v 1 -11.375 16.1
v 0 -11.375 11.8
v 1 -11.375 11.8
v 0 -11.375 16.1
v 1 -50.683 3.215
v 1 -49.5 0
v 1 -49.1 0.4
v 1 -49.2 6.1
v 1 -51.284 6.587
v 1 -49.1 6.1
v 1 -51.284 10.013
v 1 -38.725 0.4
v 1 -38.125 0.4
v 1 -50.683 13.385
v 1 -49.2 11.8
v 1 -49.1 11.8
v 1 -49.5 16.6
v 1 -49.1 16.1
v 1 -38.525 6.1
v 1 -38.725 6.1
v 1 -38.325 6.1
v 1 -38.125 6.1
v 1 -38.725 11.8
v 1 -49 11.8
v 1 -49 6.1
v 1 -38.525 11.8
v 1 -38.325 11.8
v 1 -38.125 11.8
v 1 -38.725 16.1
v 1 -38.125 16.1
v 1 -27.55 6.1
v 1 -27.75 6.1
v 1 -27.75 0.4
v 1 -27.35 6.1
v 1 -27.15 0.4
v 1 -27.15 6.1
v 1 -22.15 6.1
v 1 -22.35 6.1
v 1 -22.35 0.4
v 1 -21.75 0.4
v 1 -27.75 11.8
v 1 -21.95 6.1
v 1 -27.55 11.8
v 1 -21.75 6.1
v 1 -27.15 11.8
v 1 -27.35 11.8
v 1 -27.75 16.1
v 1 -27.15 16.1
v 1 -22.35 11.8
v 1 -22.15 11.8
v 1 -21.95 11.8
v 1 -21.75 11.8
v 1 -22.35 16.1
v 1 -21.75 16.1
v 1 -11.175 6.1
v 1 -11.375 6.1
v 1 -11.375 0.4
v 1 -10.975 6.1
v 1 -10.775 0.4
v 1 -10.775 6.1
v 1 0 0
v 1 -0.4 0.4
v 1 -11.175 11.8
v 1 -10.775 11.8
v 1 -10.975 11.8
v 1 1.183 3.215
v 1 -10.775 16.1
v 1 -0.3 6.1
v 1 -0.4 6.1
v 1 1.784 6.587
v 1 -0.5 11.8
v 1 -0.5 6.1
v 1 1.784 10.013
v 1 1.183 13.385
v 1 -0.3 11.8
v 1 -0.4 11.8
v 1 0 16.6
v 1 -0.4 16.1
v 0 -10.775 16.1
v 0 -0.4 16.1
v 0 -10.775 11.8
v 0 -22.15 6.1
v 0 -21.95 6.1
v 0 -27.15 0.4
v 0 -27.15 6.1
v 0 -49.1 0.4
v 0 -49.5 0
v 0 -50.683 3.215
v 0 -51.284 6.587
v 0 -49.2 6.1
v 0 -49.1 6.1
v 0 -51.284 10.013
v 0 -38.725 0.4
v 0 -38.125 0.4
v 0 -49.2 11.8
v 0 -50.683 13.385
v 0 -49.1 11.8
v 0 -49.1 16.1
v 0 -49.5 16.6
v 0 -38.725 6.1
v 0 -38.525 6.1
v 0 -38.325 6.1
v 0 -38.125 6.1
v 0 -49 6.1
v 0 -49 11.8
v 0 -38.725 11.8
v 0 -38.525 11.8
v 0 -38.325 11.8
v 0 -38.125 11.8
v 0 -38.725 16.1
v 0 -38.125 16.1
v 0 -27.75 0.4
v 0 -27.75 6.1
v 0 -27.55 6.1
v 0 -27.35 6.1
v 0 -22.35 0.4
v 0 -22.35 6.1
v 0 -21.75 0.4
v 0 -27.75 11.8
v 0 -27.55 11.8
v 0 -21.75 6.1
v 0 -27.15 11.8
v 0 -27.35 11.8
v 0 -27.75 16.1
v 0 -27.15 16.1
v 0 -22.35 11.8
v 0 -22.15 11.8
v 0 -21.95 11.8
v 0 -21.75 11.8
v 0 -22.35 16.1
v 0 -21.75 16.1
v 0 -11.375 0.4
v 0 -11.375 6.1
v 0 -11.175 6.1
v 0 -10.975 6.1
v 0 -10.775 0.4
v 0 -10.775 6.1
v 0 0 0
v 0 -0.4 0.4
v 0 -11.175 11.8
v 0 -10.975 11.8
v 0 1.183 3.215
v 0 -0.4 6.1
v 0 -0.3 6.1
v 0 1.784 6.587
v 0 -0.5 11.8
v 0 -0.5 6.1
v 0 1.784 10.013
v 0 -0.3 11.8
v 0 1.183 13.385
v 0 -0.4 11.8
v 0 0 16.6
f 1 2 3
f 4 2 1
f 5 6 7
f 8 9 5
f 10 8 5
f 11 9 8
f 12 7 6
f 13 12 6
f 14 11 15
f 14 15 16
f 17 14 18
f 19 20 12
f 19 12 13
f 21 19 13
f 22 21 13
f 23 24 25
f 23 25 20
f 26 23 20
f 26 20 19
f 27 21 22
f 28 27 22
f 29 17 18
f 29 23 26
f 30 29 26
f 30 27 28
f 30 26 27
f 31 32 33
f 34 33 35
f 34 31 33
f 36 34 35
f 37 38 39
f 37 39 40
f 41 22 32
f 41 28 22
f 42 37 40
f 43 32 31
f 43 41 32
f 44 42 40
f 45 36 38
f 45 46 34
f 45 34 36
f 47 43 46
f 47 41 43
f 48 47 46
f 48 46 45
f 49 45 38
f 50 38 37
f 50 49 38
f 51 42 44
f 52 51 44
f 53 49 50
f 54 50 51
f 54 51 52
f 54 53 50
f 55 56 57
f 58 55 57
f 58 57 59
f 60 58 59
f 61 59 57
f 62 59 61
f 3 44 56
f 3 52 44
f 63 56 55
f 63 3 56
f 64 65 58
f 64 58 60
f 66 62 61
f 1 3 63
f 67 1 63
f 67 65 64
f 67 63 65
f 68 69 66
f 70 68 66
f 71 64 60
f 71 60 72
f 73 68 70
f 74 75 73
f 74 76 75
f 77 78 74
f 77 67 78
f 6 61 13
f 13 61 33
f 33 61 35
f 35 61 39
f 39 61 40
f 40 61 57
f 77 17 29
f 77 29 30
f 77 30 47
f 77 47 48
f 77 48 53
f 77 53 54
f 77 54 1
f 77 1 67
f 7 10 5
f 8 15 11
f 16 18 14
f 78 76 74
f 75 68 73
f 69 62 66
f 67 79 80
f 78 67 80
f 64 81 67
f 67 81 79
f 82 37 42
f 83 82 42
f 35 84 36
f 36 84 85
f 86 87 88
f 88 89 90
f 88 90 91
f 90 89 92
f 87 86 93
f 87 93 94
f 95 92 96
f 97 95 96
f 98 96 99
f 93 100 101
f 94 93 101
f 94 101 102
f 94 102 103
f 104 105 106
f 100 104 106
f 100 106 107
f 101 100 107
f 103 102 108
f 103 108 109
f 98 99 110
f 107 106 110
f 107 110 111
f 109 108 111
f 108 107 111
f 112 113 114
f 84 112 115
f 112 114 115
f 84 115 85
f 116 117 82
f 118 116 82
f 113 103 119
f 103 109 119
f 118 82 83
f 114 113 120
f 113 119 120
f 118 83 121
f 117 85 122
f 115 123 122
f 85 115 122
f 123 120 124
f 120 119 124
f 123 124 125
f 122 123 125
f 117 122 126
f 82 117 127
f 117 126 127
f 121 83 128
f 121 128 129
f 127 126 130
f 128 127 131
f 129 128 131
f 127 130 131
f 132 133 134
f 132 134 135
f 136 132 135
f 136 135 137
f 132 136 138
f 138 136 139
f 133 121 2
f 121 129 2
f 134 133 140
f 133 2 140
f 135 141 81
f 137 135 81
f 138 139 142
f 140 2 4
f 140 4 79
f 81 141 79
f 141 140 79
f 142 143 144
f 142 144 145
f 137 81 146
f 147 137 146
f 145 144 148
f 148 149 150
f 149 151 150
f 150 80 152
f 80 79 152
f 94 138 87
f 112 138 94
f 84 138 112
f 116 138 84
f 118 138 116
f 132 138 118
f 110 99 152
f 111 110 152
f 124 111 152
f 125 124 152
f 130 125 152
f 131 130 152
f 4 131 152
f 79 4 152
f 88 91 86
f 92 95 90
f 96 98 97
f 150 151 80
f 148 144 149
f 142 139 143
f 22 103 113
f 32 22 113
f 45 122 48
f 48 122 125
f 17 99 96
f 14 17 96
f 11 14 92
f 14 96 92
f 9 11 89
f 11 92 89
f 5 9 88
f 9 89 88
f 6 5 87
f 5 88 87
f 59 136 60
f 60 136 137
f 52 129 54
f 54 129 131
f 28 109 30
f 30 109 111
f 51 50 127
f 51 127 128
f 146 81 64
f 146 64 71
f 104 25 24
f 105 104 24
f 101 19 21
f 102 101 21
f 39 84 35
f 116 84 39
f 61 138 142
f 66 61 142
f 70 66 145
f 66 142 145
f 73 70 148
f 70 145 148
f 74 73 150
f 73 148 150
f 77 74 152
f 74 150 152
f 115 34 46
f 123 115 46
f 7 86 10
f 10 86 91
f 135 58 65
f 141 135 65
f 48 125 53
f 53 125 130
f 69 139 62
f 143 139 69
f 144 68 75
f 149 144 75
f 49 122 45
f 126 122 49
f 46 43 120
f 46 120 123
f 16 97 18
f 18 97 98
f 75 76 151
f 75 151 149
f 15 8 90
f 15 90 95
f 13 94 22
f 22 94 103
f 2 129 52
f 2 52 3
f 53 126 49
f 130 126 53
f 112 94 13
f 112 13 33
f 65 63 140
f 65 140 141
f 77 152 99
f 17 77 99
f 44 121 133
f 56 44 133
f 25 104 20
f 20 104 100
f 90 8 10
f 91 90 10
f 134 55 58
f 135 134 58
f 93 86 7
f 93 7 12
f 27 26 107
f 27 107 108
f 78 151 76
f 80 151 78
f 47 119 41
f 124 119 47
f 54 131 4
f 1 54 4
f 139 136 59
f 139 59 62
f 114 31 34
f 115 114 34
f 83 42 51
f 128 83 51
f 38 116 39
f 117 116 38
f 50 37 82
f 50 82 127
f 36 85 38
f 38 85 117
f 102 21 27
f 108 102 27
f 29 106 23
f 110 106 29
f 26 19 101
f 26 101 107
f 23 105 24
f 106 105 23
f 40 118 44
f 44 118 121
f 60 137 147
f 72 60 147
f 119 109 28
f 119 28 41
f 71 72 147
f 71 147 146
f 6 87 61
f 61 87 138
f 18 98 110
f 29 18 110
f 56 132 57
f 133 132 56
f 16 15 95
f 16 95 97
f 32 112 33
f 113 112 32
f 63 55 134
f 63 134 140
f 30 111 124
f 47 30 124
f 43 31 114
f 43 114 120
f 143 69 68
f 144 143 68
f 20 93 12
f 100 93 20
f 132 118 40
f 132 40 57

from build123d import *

# Parameters (mm, degrees)
F0_W     = 10.375
F0_H     = 5.7
F0_W_2   = 4.8
F0_H_2   = 4.3
F1_DEPTH = 1
F2_W     = 0.2
F2_H     = 5.7
F3_DEPTH = 1


with BuildPart() as f1:
    # F0 (on Right) → F1 (new body)
    with BuildSketch(Plane.YZ):
        with BuildLine():
            Line((-49.5, 0), (0, 0))
            ThreePointArc((0, 0), (1.86, 8.3), (0, 16.6))
            Line((0, 16.6), (-49.5, 16.6))
            ThreePointArc((-49.5, 16.6), (-51.36, 8.3), (-49.5, 0))
        make_face()
        with Locations((-43.9125, 3.25)):
            Rectangle(F0_W, F0_H, mode=Mode.SUBTRACT)
        with Locations((-32.9375, 3.25)):
            Rectangle(F0_W, F0_H, mode=Mode.SUBTRACT)
        with Locations((-24.75, 3.25)):
            Rectangle(F0_W_2, F0_H, mode=Mode.SUBTRACT)
        with Locations((-16.5625, 3.25)):
            Rectangle(F0_W, F0_H, mode=Mode.SUBTRACT)
        with Locations((-5.5875, 3.25)):
            Rectangle(F0_W, F0_H, mode=Mode.SUBTRACT)
        with Locations((-43.9125, 13.95)):
            Rectangle(F0_W, F0_H_2, mode=Mode.SUBTRACT)
        with Locations((-32.9375, 13.95)):
            Rectangle(F0_W, F0_H_2, mode=Mode.SUBTRACT)
        with Locations((-24.75, 13.95)):
            Rectangle(F0_W_2, F0_H_2, mode=Mode.SUBTRACT)
        with Locations((-16.5625, 13.95)):
            Rectangle(F0_W, F0_H_2, mode=Mode.SUBTRACT)
        with Locations((-5.5875, 13.95)):
            Rectangle(F0_W, F0_H_2, mode=Mode.SUBTRACT)
    extrude(amount=F1_DEPTH)

    # F2 (on face) → F3 (cut, through all)
    with BuildSketch(Plane.YZ.offset(1)):
        with Locations((-49.1, 8.95)):
            Rectangle(F2_W, F2_H)
        with Locations((-38.425, 8.95)):
            Rectangle(F2_W, F2_H)
        with Locations((-27.45, 8.95)):
            Rectangle(F2_W, F2_H)
        with Locations((-22.05, 8.95)):
            Rectangle(F2_W, F2_H)
        with Locations((-11.075, 8.95)):
            Rectangle(F2_W, F2_H)
        with Locations((-0.4, 8.95)):
            Rectangle(F2_W, F2_H)
    extrude(amount=-F3_DEPTH, mode=Mode.SUBTRACT)


solid = f1.part
